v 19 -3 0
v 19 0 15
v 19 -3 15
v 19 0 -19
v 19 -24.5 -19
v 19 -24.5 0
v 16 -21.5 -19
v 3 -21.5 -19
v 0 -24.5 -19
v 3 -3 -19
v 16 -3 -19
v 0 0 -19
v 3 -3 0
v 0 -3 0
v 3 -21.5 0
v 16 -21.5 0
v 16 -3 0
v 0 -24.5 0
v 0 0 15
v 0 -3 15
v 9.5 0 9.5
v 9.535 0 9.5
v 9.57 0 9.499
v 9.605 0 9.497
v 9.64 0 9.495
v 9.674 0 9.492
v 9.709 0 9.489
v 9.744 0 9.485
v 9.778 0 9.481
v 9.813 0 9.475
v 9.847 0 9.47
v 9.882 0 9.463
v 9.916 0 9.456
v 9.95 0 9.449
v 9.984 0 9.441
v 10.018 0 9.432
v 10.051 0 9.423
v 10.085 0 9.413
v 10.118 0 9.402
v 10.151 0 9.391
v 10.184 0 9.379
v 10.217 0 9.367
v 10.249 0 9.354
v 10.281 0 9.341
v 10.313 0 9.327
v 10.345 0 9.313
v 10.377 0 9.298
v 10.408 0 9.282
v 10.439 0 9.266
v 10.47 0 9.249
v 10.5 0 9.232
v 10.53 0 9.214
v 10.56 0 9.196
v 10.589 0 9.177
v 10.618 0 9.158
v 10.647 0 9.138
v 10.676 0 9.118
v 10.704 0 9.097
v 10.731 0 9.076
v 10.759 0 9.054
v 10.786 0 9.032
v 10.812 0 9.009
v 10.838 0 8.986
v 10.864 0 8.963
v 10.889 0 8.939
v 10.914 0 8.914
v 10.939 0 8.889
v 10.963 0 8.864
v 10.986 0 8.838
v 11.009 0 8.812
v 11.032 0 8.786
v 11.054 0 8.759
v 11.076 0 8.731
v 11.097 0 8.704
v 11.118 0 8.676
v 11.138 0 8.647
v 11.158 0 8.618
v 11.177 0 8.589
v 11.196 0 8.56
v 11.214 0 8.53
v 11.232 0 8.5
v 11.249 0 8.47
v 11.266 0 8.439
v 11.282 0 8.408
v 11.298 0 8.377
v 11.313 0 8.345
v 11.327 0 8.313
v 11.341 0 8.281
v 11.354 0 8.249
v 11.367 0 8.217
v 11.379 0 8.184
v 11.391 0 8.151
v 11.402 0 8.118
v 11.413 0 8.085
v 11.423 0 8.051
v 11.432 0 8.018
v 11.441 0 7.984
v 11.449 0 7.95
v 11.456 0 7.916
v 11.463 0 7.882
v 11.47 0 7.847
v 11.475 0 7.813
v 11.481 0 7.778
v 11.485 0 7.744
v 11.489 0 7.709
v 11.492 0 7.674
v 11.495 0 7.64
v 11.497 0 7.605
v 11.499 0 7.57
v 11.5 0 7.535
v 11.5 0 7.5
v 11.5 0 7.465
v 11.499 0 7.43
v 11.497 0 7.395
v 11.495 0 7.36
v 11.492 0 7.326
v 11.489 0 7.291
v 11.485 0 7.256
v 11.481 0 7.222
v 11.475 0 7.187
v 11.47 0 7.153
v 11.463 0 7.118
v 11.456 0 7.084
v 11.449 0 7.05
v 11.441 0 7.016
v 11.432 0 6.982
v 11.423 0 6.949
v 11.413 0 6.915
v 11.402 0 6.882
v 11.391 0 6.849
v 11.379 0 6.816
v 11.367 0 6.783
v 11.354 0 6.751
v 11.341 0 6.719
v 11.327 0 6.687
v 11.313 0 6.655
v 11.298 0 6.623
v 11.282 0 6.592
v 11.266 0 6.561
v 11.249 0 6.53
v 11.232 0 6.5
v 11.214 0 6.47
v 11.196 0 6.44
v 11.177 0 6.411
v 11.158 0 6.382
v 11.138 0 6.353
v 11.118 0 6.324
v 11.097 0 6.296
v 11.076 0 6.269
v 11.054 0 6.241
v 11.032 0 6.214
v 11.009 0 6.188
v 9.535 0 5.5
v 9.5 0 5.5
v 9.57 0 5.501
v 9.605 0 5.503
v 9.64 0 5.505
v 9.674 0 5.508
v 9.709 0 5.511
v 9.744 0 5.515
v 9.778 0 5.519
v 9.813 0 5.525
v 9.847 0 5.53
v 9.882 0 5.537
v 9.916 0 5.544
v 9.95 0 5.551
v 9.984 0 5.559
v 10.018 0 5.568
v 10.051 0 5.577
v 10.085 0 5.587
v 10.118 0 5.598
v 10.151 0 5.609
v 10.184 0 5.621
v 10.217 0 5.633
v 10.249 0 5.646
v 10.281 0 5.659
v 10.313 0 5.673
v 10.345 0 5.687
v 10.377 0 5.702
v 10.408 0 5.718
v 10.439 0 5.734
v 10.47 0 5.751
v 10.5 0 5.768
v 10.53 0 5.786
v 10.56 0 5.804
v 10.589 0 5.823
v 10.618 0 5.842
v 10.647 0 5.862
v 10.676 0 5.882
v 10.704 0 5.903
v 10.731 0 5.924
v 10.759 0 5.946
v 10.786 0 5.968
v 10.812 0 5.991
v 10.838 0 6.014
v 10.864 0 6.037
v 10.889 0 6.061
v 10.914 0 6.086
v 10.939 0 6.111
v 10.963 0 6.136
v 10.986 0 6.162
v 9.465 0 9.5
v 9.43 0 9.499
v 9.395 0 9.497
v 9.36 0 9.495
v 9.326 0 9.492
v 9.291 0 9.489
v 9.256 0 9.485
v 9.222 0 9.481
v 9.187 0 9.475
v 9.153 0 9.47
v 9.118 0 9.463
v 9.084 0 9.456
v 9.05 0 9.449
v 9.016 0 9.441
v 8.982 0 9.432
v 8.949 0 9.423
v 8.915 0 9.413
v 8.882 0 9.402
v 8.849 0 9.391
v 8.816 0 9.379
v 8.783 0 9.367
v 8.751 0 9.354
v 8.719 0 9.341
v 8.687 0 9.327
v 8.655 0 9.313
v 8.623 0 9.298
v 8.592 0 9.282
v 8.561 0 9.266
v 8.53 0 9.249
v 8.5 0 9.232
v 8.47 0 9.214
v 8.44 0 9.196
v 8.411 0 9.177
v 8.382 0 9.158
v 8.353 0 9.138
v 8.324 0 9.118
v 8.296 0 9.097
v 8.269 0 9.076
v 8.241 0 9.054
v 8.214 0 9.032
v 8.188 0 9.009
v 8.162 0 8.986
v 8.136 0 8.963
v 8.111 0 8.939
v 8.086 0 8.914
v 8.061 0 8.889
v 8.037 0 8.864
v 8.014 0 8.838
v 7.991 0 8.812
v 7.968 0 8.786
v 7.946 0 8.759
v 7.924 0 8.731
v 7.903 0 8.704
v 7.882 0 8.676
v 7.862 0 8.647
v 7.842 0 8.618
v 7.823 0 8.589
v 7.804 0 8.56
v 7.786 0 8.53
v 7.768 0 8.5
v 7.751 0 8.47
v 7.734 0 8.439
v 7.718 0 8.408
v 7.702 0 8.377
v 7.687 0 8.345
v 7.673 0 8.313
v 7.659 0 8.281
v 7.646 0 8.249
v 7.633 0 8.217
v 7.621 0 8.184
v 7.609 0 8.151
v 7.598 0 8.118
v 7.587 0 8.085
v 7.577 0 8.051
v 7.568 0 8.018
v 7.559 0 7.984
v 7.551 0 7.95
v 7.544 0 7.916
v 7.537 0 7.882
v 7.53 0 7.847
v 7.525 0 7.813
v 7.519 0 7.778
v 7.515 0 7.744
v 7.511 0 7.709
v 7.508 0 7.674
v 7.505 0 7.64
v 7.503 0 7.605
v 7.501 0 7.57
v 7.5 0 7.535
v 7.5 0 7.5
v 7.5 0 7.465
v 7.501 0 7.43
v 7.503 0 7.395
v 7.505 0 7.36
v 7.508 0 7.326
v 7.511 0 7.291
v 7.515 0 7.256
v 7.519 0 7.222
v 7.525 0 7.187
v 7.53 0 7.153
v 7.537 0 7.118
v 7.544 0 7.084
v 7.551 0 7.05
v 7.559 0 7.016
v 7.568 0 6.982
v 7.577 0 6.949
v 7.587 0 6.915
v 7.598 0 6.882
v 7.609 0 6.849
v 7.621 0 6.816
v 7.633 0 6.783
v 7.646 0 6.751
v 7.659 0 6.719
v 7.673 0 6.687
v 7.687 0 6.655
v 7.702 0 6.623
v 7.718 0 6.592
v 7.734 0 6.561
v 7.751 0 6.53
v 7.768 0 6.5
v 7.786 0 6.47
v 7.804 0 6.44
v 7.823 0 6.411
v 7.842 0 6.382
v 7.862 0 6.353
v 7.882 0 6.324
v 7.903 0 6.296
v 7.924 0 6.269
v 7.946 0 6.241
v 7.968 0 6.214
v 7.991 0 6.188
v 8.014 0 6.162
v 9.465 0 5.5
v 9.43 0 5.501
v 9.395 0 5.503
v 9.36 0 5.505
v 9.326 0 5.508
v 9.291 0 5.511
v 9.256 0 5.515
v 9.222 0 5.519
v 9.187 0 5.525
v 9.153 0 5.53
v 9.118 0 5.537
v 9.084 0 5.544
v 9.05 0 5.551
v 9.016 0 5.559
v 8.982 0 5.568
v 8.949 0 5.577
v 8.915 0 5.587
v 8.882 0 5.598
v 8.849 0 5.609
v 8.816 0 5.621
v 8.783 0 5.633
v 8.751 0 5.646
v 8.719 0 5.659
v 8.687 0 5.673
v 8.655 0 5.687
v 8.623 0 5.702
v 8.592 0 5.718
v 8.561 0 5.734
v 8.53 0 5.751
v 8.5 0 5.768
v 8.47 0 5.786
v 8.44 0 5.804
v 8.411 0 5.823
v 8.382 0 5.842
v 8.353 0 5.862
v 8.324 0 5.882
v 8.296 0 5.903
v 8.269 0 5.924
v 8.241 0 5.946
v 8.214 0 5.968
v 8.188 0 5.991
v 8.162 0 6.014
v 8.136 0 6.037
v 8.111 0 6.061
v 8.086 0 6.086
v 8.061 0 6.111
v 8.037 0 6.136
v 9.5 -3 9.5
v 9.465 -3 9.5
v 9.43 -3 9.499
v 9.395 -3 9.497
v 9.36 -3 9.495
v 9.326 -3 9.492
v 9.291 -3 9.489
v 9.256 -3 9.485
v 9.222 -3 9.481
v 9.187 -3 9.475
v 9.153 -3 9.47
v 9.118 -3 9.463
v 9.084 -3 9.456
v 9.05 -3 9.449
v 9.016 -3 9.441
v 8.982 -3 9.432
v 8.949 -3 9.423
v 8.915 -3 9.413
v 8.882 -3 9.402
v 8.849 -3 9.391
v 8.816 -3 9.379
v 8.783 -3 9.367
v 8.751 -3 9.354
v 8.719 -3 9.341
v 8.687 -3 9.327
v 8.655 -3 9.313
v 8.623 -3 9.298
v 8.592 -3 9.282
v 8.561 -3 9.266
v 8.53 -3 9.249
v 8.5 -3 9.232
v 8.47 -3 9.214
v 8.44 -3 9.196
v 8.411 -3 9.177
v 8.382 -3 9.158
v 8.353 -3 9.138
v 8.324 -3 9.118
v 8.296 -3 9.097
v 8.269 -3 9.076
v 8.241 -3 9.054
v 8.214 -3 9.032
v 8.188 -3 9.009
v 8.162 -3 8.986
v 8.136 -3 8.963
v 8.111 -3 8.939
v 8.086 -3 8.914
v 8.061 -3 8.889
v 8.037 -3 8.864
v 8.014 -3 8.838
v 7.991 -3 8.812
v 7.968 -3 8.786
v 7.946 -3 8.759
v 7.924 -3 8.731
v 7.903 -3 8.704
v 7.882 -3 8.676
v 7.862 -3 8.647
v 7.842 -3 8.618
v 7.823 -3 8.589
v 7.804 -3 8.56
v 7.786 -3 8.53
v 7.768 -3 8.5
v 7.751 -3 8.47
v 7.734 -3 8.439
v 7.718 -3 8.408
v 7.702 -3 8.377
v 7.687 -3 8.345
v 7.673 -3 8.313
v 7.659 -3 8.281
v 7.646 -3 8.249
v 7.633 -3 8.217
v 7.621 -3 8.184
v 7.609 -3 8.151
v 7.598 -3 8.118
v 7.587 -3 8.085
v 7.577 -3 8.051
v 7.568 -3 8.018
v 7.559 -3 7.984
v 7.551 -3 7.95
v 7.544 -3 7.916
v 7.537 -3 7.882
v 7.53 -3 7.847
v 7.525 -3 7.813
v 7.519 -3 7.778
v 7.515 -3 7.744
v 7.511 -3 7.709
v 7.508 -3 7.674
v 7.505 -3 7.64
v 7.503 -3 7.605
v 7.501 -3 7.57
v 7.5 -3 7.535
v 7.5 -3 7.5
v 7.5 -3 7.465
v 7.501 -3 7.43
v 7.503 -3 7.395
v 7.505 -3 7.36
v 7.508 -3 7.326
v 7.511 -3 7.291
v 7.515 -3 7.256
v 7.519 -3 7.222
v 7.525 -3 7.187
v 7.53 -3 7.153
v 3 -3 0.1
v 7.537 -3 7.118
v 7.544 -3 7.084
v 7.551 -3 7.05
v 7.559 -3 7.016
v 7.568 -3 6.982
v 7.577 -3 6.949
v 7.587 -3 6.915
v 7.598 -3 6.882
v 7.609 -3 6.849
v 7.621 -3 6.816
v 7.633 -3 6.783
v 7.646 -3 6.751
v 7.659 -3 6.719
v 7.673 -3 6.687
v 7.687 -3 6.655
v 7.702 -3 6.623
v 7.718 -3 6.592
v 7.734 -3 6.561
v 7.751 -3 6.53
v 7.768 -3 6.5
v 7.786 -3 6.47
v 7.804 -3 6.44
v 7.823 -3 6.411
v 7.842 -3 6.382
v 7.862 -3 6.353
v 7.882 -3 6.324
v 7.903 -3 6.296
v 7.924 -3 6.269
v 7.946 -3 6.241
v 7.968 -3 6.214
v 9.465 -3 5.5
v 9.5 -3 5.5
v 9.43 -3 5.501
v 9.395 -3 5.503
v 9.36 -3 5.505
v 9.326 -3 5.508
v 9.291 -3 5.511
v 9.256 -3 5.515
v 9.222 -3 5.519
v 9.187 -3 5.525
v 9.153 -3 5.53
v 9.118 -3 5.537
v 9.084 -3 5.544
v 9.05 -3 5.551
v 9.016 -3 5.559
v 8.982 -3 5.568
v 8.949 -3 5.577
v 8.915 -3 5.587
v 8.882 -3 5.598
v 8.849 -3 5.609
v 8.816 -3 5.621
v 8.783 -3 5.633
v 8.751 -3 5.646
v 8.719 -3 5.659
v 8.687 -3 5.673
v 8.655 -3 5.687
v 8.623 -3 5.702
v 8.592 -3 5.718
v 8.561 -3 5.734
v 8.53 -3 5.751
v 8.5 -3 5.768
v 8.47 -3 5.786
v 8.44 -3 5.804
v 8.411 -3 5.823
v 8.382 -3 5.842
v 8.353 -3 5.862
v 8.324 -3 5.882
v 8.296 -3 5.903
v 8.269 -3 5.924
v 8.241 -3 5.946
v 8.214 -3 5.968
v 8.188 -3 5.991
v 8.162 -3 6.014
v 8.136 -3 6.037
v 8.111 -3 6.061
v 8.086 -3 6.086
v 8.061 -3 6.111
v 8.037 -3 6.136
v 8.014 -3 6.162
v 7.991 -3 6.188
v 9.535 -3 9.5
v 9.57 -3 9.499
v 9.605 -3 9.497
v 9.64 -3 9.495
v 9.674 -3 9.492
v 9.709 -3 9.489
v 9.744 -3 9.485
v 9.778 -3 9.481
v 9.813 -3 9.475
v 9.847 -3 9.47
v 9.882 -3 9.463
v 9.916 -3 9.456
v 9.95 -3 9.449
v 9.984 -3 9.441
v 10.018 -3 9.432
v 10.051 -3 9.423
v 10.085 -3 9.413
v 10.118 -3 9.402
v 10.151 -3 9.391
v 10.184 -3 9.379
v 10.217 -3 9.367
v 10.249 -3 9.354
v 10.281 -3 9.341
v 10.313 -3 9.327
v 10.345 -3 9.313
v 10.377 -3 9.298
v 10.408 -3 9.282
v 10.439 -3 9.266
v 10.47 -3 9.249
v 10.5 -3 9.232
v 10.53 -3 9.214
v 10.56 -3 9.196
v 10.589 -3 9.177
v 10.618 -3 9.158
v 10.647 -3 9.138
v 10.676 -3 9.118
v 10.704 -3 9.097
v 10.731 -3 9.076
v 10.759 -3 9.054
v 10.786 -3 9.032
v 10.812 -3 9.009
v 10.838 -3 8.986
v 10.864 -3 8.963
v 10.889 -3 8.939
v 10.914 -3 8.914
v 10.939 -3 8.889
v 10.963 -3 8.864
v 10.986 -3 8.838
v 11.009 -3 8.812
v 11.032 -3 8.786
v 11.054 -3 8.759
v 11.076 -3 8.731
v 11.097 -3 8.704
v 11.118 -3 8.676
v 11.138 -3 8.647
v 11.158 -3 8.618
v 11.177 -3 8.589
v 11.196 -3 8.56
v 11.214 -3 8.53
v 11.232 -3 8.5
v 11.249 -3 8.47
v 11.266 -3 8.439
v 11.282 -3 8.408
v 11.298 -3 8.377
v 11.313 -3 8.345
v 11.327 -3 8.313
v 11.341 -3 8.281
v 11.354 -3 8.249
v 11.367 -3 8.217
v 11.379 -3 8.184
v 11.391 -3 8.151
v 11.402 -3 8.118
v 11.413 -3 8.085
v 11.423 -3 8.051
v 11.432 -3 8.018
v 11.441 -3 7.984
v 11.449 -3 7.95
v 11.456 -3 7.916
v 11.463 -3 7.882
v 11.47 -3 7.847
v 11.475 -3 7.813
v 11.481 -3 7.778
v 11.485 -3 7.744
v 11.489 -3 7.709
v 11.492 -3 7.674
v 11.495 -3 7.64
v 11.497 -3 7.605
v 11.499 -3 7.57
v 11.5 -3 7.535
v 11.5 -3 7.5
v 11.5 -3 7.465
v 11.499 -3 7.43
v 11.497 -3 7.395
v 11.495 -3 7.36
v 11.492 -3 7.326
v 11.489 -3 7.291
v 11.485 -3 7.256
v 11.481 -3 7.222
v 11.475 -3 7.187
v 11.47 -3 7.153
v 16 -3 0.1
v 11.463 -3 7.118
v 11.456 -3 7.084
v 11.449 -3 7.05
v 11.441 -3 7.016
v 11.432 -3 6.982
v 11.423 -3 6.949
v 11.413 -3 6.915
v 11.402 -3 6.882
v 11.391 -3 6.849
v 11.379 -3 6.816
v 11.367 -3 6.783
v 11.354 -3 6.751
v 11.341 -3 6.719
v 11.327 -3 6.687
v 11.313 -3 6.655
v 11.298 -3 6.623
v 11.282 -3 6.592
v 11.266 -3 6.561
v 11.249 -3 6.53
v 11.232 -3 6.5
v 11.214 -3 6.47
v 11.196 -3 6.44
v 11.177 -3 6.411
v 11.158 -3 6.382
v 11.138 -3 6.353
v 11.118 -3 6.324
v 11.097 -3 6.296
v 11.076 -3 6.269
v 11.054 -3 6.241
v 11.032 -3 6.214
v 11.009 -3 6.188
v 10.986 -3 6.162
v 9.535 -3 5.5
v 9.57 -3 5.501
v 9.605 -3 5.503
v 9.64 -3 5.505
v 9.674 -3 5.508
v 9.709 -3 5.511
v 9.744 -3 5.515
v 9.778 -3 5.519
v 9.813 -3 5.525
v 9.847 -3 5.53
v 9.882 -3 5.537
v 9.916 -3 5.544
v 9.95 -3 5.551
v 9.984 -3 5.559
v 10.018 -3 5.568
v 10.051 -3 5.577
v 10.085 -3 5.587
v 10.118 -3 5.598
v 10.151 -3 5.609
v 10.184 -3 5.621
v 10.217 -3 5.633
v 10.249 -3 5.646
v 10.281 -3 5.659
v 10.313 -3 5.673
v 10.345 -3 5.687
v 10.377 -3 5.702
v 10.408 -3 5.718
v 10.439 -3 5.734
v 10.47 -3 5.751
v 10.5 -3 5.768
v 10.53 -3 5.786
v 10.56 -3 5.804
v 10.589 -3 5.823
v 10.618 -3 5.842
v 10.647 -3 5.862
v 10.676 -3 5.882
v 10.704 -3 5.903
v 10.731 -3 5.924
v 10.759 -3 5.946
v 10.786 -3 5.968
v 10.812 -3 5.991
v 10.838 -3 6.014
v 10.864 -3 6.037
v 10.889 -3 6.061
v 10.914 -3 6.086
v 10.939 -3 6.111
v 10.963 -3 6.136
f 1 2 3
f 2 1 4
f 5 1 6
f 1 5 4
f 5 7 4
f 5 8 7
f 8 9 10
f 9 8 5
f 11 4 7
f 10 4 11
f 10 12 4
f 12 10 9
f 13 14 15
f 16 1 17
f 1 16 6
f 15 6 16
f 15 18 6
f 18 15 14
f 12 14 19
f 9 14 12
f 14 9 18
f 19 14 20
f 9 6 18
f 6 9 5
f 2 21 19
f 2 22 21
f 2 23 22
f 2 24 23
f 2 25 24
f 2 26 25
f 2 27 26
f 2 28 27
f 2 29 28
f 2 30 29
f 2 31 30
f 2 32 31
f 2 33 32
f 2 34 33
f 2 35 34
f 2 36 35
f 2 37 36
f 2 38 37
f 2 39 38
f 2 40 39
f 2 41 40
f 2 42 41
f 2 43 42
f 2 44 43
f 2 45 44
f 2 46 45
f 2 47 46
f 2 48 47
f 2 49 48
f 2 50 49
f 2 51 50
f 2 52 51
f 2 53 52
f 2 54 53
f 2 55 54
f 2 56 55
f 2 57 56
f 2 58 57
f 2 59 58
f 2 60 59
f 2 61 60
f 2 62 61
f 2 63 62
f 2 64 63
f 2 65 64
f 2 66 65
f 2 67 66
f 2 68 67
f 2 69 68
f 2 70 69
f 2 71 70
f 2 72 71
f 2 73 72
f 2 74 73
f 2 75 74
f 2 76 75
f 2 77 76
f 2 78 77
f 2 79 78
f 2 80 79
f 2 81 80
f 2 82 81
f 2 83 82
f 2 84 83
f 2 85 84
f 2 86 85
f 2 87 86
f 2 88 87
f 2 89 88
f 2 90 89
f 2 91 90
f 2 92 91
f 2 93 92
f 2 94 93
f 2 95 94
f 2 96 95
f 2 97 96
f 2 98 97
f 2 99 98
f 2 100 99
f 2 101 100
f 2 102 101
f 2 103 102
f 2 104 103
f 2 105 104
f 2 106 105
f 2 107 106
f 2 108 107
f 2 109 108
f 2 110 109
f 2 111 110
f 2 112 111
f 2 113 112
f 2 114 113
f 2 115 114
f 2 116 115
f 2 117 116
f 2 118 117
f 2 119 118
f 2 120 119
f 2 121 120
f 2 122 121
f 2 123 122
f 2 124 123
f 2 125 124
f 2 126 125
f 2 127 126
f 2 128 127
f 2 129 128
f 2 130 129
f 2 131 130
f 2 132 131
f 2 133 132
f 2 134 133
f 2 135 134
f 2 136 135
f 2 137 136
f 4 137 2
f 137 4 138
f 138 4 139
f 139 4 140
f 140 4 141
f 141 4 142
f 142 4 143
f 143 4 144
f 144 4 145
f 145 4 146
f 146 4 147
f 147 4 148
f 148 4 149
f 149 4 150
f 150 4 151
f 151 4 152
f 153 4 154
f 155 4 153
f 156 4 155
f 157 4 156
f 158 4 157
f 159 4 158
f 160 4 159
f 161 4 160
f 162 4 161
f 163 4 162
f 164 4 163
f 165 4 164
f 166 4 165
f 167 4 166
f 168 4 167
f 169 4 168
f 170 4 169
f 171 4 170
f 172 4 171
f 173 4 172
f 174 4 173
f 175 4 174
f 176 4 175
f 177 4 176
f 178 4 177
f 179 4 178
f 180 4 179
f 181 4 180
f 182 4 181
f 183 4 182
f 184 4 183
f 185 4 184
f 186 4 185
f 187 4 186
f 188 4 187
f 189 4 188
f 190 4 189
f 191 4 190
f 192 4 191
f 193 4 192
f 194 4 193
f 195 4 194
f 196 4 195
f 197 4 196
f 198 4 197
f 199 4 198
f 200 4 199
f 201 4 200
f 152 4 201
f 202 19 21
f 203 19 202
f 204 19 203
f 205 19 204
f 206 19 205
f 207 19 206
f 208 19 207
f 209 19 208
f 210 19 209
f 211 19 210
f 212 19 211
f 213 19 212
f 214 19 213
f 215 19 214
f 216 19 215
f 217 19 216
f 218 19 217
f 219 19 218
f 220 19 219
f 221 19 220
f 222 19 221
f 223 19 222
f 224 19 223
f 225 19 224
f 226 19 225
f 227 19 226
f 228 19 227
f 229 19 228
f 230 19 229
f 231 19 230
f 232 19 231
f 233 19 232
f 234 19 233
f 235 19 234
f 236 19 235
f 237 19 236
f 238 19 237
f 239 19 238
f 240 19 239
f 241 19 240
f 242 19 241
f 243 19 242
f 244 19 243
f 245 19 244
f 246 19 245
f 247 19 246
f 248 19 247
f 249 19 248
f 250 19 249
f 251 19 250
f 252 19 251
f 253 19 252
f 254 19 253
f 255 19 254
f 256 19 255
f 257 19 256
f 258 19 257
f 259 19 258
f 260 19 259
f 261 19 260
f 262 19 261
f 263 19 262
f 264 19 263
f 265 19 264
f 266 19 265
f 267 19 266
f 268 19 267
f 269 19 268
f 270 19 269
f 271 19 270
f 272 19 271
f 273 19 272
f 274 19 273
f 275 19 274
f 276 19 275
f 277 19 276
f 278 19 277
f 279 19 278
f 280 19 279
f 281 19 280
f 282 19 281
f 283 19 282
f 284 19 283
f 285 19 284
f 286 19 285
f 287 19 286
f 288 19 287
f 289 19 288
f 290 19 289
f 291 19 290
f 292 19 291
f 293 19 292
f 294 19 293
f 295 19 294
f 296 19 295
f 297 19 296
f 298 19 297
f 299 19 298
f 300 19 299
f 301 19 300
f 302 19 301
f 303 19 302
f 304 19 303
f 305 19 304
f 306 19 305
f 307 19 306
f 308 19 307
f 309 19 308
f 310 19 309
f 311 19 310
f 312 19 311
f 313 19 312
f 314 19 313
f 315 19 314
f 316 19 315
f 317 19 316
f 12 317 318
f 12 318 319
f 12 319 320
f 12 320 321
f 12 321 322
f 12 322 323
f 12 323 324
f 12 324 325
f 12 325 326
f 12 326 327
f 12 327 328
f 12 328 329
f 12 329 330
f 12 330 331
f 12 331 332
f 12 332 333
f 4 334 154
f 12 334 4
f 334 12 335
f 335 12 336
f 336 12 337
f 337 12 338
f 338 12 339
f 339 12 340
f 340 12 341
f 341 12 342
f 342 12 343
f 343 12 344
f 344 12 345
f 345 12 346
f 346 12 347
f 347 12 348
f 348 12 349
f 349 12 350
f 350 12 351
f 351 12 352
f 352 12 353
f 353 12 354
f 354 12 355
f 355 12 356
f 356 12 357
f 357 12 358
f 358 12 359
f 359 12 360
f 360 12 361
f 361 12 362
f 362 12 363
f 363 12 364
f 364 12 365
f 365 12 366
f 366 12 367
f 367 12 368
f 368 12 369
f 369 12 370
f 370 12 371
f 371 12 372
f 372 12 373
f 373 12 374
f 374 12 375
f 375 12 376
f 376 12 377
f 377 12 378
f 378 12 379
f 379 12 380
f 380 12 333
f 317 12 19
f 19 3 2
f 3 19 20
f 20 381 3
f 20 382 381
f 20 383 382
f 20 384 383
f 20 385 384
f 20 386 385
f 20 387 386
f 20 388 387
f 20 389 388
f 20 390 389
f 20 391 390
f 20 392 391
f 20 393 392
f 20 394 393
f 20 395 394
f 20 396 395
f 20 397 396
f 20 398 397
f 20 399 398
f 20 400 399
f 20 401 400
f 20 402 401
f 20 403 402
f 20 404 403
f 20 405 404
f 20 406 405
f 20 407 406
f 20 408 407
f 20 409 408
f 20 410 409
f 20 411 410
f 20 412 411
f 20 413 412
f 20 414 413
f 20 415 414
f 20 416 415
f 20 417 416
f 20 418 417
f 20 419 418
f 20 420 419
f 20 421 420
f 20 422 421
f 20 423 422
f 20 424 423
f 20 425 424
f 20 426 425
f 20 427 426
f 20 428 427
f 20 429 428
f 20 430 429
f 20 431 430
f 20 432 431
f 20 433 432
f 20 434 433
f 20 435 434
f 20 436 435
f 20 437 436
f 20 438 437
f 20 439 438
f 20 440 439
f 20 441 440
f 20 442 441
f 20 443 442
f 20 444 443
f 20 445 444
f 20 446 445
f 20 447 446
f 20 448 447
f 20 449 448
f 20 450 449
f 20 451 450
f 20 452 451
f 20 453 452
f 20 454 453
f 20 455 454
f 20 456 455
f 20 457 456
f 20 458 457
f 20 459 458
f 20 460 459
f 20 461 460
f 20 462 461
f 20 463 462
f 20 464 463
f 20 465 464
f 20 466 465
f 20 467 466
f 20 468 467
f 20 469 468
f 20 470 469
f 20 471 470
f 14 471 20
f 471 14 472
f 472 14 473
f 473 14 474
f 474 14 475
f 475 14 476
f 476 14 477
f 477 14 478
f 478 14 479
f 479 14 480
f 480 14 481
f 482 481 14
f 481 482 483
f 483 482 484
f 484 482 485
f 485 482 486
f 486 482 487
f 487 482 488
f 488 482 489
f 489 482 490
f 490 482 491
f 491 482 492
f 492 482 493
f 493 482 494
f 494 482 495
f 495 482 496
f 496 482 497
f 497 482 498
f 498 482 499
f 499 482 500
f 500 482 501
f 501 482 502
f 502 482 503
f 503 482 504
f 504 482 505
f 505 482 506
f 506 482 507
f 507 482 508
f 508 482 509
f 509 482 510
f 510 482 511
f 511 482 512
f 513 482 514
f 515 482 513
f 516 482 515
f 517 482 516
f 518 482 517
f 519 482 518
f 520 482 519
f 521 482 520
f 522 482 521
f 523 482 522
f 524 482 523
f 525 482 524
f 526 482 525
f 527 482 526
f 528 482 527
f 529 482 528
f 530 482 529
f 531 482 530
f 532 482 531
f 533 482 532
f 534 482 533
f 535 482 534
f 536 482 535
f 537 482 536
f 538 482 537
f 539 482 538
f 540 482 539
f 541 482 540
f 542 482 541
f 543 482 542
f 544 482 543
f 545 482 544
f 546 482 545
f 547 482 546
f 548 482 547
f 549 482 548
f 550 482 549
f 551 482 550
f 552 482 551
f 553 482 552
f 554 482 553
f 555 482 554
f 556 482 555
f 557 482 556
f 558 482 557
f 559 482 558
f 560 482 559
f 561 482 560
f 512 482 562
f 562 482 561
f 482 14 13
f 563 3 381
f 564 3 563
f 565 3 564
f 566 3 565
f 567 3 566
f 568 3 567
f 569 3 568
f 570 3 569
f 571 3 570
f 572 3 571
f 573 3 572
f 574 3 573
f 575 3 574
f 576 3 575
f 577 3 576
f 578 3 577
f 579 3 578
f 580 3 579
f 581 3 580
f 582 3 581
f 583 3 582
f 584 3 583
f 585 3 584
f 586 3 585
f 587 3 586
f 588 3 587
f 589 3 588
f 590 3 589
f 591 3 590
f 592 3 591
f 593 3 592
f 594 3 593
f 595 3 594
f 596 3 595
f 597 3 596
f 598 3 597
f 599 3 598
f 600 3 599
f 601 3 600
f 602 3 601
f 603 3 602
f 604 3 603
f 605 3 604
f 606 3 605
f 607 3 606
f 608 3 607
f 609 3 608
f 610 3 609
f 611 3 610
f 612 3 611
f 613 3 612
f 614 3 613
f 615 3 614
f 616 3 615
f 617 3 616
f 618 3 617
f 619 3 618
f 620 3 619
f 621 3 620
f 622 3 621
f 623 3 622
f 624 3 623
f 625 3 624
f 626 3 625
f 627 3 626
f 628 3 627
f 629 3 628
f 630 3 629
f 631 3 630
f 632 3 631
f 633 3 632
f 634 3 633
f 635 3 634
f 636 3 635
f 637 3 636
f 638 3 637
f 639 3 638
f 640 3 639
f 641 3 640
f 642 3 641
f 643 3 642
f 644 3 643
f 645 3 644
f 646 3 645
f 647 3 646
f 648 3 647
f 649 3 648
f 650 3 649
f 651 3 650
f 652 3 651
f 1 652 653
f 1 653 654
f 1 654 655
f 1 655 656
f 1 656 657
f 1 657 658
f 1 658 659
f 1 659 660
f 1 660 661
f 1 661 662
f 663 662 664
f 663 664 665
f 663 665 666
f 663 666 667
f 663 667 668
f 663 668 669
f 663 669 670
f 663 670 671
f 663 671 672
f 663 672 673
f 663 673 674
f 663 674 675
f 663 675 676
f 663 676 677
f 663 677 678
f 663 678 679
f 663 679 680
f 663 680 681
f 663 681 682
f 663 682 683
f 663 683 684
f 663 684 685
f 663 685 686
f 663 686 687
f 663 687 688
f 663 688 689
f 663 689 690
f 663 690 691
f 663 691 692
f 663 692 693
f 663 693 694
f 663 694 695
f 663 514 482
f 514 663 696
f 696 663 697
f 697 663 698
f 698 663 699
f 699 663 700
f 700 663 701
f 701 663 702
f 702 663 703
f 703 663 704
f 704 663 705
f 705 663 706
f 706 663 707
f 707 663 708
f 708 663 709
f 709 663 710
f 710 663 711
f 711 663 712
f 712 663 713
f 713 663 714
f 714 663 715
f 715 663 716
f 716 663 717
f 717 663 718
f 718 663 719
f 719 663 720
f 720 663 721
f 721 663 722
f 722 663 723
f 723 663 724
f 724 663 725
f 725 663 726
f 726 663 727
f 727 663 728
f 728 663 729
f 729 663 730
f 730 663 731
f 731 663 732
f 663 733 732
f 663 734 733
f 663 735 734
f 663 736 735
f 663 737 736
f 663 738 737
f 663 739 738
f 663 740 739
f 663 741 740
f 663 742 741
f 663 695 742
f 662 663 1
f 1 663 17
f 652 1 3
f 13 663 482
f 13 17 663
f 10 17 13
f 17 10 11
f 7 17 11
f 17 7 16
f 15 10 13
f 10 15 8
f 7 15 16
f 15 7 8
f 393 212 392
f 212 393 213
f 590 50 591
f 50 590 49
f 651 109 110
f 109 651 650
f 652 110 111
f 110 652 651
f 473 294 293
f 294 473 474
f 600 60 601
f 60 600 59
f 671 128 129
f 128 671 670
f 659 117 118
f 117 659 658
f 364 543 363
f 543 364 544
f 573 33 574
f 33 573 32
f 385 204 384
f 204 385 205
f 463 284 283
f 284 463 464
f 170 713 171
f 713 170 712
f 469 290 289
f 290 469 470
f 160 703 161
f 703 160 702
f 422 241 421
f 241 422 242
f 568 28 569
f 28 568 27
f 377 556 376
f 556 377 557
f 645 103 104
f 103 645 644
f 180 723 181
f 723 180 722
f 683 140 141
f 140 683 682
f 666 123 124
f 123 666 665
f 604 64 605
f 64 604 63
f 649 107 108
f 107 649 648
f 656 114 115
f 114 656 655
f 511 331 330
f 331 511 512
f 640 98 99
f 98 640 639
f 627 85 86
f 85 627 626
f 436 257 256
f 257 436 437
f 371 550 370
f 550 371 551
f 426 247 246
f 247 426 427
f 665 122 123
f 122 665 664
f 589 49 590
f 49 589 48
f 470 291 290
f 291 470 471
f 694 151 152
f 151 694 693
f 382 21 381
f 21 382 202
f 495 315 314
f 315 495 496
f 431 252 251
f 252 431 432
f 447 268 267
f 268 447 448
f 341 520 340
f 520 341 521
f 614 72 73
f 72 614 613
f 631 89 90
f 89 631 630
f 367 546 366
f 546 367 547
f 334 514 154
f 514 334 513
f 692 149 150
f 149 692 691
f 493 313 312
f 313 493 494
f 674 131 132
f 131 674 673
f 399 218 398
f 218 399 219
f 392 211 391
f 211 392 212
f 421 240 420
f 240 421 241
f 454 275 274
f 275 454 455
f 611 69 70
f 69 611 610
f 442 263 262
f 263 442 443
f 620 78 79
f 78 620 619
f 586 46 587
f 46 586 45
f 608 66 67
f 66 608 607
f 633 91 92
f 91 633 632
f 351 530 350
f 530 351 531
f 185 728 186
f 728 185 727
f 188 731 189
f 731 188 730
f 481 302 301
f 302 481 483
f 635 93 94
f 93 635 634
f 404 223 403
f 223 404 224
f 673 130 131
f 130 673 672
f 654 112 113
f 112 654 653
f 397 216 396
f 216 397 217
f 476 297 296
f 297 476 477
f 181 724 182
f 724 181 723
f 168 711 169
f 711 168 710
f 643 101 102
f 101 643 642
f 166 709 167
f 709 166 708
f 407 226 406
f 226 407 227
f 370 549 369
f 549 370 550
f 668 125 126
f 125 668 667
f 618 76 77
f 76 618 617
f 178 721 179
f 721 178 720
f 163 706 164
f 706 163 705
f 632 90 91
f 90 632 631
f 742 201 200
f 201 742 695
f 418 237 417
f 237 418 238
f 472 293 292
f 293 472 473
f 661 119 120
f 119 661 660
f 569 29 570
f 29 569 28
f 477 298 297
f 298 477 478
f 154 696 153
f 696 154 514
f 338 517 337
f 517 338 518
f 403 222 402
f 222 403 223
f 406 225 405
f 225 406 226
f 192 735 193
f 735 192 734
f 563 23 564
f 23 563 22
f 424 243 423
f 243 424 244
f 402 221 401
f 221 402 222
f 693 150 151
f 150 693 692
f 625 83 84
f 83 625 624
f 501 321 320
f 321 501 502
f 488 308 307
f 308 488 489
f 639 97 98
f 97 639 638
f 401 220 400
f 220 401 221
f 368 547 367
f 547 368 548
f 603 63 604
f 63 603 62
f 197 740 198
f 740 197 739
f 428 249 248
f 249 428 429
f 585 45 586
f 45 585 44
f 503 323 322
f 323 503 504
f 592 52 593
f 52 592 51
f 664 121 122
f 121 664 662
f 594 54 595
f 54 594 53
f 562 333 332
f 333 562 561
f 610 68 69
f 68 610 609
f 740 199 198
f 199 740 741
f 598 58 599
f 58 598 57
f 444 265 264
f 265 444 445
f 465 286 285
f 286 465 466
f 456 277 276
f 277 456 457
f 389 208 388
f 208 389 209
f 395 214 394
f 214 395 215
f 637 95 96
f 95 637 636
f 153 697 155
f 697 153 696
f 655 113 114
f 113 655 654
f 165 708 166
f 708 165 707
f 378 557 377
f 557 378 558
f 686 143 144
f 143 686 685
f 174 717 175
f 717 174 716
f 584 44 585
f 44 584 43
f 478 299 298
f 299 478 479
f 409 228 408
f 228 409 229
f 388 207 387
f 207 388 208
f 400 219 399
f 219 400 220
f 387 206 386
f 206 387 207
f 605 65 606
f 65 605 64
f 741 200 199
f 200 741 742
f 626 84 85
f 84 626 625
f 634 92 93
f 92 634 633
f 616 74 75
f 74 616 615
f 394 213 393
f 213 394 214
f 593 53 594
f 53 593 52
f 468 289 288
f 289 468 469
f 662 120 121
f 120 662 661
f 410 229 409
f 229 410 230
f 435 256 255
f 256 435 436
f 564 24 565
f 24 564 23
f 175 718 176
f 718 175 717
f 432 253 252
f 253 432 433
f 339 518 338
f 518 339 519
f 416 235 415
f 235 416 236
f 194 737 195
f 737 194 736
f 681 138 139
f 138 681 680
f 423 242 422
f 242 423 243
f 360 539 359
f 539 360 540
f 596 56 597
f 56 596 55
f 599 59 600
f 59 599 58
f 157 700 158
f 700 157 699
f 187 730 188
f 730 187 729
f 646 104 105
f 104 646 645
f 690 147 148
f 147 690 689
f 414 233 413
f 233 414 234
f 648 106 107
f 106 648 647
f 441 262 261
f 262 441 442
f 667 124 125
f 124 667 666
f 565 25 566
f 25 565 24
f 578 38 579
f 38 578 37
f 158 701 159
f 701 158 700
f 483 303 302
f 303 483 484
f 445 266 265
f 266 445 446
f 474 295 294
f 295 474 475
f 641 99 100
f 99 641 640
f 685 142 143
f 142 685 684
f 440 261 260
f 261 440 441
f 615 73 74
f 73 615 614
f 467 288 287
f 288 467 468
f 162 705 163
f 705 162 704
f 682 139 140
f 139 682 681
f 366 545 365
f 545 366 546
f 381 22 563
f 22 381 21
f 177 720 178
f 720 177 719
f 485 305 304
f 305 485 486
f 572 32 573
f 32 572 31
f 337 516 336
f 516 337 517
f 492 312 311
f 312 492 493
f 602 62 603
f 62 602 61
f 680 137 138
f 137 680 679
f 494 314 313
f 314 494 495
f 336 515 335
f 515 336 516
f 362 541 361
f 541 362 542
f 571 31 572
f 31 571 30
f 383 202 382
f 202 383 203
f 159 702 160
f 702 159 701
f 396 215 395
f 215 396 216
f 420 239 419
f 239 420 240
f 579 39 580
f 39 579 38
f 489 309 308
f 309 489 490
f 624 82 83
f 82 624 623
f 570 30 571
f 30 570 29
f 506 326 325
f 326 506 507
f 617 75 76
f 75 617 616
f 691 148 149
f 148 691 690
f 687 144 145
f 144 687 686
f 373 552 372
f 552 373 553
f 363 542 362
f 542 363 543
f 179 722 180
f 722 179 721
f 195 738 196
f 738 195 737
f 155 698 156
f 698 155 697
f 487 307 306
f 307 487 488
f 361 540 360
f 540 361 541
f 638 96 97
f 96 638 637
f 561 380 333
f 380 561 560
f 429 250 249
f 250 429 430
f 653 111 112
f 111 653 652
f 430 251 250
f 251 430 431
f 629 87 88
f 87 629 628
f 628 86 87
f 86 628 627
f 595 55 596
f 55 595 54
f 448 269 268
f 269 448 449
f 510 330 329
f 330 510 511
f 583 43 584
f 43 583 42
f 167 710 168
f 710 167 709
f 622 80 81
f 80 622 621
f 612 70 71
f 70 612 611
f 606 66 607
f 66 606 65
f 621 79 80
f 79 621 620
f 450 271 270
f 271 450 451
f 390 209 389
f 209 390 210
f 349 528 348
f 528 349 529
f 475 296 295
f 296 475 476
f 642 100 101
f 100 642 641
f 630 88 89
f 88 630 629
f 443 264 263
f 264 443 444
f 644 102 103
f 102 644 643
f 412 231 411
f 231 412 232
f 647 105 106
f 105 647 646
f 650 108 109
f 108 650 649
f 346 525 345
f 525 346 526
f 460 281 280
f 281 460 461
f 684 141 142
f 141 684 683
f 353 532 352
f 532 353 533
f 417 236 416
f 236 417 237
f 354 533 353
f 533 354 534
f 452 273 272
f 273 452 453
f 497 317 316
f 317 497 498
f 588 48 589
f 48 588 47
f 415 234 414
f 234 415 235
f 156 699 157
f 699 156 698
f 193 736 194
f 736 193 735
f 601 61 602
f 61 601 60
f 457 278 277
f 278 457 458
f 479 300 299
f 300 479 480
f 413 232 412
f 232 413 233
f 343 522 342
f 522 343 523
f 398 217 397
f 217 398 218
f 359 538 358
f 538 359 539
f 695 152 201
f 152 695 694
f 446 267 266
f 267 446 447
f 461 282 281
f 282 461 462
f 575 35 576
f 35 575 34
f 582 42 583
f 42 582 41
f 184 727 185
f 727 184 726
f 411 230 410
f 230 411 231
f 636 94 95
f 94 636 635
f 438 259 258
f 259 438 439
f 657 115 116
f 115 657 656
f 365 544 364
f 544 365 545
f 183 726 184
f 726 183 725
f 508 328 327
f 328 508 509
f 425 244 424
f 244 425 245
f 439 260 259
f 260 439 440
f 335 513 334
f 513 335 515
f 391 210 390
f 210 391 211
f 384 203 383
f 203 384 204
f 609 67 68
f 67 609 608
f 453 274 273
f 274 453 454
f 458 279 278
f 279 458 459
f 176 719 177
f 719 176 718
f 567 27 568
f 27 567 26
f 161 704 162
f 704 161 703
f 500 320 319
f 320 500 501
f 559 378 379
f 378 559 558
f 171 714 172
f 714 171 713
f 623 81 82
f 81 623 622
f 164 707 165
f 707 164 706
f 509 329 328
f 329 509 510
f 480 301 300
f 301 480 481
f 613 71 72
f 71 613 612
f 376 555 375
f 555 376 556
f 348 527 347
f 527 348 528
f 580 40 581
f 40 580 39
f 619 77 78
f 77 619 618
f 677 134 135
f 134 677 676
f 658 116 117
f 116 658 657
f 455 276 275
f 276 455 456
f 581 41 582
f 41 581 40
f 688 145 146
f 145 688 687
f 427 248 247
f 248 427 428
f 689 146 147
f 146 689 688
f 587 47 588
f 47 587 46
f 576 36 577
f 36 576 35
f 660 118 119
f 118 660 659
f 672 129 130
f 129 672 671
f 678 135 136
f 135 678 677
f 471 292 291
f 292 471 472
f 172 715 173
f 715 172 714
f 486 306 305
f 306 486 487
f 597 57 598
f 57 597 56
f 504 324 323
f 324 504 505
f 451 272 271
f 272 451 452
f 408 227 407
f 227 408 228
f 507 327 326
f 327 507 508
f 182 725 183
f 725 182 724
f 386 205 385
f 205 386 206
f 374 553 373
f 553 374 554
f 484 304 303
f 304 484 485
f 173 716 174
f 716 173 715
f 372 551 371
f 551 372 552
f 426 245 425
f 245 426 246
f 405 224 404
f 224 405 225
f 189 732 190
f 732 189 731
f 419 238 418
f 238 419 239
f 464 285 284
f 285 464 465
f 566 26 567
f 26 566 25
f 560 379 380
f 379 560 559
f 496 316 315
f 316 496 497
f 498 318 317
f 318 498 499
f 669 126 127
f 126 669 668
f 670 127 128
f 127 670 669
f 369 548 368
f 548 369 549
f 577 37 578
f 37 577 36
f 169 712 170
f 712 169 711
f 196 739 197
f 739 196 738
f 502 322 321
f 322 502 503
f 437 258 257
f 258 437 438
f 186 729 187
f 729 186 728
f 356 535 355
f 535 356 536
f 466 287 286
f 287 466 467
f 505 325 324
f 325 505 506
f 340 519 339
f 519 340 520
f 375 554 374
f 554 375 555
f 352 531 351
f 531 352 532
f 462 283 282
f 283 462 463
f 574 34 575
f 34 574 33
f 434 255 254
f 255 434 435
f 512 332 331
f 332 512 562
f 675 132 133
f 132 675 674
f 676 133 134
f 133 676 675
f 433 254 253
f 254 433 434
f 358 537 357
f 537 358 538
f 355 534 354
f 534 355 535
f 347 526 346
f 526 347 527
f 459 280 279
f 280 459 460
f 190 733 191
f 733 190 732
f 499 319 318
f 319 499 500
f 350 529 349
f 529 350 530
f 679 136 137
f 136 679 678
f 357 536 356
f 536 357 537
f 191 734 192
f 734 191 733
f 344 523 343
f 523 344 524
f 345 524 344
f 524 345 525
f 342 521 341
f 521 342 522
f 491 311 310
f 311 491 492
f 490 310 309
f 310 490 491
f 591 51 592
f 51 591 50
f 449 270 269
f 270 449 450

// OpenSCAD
sides = 360;
hole_size = 4.0;

//
//  No need to rotate it in the slicer if we do it here.
//  Slic3r PE on a Prusa i3 Mk3 prints this without any
//  supports or brim.
//

rotate ([180, 0, 0])  {
  difference () {
    union () {
      translate ([0, 0, 0]) // main cube
        cube ([3 + 13 + 3, 3 + 18.5 + 3, 3 + 13 + 3]);

      translate ([0, 0, -15]) // screw tab
        cube ([3 + 13 + 3, 3, 15]);
    }

    translate ([3, 3, -0.1]) // cutout
      cube ([13, 18.5, 3 + 13 + 3 + 0.2]);

    translate ([(3 + 13 + 3) / 2, -0.1, -(15 / 2)]) // screw
      rotate ([270, 0, 0])
        cylinder (d=hole_size, h=3.2, $fn = sides);
  }
}
